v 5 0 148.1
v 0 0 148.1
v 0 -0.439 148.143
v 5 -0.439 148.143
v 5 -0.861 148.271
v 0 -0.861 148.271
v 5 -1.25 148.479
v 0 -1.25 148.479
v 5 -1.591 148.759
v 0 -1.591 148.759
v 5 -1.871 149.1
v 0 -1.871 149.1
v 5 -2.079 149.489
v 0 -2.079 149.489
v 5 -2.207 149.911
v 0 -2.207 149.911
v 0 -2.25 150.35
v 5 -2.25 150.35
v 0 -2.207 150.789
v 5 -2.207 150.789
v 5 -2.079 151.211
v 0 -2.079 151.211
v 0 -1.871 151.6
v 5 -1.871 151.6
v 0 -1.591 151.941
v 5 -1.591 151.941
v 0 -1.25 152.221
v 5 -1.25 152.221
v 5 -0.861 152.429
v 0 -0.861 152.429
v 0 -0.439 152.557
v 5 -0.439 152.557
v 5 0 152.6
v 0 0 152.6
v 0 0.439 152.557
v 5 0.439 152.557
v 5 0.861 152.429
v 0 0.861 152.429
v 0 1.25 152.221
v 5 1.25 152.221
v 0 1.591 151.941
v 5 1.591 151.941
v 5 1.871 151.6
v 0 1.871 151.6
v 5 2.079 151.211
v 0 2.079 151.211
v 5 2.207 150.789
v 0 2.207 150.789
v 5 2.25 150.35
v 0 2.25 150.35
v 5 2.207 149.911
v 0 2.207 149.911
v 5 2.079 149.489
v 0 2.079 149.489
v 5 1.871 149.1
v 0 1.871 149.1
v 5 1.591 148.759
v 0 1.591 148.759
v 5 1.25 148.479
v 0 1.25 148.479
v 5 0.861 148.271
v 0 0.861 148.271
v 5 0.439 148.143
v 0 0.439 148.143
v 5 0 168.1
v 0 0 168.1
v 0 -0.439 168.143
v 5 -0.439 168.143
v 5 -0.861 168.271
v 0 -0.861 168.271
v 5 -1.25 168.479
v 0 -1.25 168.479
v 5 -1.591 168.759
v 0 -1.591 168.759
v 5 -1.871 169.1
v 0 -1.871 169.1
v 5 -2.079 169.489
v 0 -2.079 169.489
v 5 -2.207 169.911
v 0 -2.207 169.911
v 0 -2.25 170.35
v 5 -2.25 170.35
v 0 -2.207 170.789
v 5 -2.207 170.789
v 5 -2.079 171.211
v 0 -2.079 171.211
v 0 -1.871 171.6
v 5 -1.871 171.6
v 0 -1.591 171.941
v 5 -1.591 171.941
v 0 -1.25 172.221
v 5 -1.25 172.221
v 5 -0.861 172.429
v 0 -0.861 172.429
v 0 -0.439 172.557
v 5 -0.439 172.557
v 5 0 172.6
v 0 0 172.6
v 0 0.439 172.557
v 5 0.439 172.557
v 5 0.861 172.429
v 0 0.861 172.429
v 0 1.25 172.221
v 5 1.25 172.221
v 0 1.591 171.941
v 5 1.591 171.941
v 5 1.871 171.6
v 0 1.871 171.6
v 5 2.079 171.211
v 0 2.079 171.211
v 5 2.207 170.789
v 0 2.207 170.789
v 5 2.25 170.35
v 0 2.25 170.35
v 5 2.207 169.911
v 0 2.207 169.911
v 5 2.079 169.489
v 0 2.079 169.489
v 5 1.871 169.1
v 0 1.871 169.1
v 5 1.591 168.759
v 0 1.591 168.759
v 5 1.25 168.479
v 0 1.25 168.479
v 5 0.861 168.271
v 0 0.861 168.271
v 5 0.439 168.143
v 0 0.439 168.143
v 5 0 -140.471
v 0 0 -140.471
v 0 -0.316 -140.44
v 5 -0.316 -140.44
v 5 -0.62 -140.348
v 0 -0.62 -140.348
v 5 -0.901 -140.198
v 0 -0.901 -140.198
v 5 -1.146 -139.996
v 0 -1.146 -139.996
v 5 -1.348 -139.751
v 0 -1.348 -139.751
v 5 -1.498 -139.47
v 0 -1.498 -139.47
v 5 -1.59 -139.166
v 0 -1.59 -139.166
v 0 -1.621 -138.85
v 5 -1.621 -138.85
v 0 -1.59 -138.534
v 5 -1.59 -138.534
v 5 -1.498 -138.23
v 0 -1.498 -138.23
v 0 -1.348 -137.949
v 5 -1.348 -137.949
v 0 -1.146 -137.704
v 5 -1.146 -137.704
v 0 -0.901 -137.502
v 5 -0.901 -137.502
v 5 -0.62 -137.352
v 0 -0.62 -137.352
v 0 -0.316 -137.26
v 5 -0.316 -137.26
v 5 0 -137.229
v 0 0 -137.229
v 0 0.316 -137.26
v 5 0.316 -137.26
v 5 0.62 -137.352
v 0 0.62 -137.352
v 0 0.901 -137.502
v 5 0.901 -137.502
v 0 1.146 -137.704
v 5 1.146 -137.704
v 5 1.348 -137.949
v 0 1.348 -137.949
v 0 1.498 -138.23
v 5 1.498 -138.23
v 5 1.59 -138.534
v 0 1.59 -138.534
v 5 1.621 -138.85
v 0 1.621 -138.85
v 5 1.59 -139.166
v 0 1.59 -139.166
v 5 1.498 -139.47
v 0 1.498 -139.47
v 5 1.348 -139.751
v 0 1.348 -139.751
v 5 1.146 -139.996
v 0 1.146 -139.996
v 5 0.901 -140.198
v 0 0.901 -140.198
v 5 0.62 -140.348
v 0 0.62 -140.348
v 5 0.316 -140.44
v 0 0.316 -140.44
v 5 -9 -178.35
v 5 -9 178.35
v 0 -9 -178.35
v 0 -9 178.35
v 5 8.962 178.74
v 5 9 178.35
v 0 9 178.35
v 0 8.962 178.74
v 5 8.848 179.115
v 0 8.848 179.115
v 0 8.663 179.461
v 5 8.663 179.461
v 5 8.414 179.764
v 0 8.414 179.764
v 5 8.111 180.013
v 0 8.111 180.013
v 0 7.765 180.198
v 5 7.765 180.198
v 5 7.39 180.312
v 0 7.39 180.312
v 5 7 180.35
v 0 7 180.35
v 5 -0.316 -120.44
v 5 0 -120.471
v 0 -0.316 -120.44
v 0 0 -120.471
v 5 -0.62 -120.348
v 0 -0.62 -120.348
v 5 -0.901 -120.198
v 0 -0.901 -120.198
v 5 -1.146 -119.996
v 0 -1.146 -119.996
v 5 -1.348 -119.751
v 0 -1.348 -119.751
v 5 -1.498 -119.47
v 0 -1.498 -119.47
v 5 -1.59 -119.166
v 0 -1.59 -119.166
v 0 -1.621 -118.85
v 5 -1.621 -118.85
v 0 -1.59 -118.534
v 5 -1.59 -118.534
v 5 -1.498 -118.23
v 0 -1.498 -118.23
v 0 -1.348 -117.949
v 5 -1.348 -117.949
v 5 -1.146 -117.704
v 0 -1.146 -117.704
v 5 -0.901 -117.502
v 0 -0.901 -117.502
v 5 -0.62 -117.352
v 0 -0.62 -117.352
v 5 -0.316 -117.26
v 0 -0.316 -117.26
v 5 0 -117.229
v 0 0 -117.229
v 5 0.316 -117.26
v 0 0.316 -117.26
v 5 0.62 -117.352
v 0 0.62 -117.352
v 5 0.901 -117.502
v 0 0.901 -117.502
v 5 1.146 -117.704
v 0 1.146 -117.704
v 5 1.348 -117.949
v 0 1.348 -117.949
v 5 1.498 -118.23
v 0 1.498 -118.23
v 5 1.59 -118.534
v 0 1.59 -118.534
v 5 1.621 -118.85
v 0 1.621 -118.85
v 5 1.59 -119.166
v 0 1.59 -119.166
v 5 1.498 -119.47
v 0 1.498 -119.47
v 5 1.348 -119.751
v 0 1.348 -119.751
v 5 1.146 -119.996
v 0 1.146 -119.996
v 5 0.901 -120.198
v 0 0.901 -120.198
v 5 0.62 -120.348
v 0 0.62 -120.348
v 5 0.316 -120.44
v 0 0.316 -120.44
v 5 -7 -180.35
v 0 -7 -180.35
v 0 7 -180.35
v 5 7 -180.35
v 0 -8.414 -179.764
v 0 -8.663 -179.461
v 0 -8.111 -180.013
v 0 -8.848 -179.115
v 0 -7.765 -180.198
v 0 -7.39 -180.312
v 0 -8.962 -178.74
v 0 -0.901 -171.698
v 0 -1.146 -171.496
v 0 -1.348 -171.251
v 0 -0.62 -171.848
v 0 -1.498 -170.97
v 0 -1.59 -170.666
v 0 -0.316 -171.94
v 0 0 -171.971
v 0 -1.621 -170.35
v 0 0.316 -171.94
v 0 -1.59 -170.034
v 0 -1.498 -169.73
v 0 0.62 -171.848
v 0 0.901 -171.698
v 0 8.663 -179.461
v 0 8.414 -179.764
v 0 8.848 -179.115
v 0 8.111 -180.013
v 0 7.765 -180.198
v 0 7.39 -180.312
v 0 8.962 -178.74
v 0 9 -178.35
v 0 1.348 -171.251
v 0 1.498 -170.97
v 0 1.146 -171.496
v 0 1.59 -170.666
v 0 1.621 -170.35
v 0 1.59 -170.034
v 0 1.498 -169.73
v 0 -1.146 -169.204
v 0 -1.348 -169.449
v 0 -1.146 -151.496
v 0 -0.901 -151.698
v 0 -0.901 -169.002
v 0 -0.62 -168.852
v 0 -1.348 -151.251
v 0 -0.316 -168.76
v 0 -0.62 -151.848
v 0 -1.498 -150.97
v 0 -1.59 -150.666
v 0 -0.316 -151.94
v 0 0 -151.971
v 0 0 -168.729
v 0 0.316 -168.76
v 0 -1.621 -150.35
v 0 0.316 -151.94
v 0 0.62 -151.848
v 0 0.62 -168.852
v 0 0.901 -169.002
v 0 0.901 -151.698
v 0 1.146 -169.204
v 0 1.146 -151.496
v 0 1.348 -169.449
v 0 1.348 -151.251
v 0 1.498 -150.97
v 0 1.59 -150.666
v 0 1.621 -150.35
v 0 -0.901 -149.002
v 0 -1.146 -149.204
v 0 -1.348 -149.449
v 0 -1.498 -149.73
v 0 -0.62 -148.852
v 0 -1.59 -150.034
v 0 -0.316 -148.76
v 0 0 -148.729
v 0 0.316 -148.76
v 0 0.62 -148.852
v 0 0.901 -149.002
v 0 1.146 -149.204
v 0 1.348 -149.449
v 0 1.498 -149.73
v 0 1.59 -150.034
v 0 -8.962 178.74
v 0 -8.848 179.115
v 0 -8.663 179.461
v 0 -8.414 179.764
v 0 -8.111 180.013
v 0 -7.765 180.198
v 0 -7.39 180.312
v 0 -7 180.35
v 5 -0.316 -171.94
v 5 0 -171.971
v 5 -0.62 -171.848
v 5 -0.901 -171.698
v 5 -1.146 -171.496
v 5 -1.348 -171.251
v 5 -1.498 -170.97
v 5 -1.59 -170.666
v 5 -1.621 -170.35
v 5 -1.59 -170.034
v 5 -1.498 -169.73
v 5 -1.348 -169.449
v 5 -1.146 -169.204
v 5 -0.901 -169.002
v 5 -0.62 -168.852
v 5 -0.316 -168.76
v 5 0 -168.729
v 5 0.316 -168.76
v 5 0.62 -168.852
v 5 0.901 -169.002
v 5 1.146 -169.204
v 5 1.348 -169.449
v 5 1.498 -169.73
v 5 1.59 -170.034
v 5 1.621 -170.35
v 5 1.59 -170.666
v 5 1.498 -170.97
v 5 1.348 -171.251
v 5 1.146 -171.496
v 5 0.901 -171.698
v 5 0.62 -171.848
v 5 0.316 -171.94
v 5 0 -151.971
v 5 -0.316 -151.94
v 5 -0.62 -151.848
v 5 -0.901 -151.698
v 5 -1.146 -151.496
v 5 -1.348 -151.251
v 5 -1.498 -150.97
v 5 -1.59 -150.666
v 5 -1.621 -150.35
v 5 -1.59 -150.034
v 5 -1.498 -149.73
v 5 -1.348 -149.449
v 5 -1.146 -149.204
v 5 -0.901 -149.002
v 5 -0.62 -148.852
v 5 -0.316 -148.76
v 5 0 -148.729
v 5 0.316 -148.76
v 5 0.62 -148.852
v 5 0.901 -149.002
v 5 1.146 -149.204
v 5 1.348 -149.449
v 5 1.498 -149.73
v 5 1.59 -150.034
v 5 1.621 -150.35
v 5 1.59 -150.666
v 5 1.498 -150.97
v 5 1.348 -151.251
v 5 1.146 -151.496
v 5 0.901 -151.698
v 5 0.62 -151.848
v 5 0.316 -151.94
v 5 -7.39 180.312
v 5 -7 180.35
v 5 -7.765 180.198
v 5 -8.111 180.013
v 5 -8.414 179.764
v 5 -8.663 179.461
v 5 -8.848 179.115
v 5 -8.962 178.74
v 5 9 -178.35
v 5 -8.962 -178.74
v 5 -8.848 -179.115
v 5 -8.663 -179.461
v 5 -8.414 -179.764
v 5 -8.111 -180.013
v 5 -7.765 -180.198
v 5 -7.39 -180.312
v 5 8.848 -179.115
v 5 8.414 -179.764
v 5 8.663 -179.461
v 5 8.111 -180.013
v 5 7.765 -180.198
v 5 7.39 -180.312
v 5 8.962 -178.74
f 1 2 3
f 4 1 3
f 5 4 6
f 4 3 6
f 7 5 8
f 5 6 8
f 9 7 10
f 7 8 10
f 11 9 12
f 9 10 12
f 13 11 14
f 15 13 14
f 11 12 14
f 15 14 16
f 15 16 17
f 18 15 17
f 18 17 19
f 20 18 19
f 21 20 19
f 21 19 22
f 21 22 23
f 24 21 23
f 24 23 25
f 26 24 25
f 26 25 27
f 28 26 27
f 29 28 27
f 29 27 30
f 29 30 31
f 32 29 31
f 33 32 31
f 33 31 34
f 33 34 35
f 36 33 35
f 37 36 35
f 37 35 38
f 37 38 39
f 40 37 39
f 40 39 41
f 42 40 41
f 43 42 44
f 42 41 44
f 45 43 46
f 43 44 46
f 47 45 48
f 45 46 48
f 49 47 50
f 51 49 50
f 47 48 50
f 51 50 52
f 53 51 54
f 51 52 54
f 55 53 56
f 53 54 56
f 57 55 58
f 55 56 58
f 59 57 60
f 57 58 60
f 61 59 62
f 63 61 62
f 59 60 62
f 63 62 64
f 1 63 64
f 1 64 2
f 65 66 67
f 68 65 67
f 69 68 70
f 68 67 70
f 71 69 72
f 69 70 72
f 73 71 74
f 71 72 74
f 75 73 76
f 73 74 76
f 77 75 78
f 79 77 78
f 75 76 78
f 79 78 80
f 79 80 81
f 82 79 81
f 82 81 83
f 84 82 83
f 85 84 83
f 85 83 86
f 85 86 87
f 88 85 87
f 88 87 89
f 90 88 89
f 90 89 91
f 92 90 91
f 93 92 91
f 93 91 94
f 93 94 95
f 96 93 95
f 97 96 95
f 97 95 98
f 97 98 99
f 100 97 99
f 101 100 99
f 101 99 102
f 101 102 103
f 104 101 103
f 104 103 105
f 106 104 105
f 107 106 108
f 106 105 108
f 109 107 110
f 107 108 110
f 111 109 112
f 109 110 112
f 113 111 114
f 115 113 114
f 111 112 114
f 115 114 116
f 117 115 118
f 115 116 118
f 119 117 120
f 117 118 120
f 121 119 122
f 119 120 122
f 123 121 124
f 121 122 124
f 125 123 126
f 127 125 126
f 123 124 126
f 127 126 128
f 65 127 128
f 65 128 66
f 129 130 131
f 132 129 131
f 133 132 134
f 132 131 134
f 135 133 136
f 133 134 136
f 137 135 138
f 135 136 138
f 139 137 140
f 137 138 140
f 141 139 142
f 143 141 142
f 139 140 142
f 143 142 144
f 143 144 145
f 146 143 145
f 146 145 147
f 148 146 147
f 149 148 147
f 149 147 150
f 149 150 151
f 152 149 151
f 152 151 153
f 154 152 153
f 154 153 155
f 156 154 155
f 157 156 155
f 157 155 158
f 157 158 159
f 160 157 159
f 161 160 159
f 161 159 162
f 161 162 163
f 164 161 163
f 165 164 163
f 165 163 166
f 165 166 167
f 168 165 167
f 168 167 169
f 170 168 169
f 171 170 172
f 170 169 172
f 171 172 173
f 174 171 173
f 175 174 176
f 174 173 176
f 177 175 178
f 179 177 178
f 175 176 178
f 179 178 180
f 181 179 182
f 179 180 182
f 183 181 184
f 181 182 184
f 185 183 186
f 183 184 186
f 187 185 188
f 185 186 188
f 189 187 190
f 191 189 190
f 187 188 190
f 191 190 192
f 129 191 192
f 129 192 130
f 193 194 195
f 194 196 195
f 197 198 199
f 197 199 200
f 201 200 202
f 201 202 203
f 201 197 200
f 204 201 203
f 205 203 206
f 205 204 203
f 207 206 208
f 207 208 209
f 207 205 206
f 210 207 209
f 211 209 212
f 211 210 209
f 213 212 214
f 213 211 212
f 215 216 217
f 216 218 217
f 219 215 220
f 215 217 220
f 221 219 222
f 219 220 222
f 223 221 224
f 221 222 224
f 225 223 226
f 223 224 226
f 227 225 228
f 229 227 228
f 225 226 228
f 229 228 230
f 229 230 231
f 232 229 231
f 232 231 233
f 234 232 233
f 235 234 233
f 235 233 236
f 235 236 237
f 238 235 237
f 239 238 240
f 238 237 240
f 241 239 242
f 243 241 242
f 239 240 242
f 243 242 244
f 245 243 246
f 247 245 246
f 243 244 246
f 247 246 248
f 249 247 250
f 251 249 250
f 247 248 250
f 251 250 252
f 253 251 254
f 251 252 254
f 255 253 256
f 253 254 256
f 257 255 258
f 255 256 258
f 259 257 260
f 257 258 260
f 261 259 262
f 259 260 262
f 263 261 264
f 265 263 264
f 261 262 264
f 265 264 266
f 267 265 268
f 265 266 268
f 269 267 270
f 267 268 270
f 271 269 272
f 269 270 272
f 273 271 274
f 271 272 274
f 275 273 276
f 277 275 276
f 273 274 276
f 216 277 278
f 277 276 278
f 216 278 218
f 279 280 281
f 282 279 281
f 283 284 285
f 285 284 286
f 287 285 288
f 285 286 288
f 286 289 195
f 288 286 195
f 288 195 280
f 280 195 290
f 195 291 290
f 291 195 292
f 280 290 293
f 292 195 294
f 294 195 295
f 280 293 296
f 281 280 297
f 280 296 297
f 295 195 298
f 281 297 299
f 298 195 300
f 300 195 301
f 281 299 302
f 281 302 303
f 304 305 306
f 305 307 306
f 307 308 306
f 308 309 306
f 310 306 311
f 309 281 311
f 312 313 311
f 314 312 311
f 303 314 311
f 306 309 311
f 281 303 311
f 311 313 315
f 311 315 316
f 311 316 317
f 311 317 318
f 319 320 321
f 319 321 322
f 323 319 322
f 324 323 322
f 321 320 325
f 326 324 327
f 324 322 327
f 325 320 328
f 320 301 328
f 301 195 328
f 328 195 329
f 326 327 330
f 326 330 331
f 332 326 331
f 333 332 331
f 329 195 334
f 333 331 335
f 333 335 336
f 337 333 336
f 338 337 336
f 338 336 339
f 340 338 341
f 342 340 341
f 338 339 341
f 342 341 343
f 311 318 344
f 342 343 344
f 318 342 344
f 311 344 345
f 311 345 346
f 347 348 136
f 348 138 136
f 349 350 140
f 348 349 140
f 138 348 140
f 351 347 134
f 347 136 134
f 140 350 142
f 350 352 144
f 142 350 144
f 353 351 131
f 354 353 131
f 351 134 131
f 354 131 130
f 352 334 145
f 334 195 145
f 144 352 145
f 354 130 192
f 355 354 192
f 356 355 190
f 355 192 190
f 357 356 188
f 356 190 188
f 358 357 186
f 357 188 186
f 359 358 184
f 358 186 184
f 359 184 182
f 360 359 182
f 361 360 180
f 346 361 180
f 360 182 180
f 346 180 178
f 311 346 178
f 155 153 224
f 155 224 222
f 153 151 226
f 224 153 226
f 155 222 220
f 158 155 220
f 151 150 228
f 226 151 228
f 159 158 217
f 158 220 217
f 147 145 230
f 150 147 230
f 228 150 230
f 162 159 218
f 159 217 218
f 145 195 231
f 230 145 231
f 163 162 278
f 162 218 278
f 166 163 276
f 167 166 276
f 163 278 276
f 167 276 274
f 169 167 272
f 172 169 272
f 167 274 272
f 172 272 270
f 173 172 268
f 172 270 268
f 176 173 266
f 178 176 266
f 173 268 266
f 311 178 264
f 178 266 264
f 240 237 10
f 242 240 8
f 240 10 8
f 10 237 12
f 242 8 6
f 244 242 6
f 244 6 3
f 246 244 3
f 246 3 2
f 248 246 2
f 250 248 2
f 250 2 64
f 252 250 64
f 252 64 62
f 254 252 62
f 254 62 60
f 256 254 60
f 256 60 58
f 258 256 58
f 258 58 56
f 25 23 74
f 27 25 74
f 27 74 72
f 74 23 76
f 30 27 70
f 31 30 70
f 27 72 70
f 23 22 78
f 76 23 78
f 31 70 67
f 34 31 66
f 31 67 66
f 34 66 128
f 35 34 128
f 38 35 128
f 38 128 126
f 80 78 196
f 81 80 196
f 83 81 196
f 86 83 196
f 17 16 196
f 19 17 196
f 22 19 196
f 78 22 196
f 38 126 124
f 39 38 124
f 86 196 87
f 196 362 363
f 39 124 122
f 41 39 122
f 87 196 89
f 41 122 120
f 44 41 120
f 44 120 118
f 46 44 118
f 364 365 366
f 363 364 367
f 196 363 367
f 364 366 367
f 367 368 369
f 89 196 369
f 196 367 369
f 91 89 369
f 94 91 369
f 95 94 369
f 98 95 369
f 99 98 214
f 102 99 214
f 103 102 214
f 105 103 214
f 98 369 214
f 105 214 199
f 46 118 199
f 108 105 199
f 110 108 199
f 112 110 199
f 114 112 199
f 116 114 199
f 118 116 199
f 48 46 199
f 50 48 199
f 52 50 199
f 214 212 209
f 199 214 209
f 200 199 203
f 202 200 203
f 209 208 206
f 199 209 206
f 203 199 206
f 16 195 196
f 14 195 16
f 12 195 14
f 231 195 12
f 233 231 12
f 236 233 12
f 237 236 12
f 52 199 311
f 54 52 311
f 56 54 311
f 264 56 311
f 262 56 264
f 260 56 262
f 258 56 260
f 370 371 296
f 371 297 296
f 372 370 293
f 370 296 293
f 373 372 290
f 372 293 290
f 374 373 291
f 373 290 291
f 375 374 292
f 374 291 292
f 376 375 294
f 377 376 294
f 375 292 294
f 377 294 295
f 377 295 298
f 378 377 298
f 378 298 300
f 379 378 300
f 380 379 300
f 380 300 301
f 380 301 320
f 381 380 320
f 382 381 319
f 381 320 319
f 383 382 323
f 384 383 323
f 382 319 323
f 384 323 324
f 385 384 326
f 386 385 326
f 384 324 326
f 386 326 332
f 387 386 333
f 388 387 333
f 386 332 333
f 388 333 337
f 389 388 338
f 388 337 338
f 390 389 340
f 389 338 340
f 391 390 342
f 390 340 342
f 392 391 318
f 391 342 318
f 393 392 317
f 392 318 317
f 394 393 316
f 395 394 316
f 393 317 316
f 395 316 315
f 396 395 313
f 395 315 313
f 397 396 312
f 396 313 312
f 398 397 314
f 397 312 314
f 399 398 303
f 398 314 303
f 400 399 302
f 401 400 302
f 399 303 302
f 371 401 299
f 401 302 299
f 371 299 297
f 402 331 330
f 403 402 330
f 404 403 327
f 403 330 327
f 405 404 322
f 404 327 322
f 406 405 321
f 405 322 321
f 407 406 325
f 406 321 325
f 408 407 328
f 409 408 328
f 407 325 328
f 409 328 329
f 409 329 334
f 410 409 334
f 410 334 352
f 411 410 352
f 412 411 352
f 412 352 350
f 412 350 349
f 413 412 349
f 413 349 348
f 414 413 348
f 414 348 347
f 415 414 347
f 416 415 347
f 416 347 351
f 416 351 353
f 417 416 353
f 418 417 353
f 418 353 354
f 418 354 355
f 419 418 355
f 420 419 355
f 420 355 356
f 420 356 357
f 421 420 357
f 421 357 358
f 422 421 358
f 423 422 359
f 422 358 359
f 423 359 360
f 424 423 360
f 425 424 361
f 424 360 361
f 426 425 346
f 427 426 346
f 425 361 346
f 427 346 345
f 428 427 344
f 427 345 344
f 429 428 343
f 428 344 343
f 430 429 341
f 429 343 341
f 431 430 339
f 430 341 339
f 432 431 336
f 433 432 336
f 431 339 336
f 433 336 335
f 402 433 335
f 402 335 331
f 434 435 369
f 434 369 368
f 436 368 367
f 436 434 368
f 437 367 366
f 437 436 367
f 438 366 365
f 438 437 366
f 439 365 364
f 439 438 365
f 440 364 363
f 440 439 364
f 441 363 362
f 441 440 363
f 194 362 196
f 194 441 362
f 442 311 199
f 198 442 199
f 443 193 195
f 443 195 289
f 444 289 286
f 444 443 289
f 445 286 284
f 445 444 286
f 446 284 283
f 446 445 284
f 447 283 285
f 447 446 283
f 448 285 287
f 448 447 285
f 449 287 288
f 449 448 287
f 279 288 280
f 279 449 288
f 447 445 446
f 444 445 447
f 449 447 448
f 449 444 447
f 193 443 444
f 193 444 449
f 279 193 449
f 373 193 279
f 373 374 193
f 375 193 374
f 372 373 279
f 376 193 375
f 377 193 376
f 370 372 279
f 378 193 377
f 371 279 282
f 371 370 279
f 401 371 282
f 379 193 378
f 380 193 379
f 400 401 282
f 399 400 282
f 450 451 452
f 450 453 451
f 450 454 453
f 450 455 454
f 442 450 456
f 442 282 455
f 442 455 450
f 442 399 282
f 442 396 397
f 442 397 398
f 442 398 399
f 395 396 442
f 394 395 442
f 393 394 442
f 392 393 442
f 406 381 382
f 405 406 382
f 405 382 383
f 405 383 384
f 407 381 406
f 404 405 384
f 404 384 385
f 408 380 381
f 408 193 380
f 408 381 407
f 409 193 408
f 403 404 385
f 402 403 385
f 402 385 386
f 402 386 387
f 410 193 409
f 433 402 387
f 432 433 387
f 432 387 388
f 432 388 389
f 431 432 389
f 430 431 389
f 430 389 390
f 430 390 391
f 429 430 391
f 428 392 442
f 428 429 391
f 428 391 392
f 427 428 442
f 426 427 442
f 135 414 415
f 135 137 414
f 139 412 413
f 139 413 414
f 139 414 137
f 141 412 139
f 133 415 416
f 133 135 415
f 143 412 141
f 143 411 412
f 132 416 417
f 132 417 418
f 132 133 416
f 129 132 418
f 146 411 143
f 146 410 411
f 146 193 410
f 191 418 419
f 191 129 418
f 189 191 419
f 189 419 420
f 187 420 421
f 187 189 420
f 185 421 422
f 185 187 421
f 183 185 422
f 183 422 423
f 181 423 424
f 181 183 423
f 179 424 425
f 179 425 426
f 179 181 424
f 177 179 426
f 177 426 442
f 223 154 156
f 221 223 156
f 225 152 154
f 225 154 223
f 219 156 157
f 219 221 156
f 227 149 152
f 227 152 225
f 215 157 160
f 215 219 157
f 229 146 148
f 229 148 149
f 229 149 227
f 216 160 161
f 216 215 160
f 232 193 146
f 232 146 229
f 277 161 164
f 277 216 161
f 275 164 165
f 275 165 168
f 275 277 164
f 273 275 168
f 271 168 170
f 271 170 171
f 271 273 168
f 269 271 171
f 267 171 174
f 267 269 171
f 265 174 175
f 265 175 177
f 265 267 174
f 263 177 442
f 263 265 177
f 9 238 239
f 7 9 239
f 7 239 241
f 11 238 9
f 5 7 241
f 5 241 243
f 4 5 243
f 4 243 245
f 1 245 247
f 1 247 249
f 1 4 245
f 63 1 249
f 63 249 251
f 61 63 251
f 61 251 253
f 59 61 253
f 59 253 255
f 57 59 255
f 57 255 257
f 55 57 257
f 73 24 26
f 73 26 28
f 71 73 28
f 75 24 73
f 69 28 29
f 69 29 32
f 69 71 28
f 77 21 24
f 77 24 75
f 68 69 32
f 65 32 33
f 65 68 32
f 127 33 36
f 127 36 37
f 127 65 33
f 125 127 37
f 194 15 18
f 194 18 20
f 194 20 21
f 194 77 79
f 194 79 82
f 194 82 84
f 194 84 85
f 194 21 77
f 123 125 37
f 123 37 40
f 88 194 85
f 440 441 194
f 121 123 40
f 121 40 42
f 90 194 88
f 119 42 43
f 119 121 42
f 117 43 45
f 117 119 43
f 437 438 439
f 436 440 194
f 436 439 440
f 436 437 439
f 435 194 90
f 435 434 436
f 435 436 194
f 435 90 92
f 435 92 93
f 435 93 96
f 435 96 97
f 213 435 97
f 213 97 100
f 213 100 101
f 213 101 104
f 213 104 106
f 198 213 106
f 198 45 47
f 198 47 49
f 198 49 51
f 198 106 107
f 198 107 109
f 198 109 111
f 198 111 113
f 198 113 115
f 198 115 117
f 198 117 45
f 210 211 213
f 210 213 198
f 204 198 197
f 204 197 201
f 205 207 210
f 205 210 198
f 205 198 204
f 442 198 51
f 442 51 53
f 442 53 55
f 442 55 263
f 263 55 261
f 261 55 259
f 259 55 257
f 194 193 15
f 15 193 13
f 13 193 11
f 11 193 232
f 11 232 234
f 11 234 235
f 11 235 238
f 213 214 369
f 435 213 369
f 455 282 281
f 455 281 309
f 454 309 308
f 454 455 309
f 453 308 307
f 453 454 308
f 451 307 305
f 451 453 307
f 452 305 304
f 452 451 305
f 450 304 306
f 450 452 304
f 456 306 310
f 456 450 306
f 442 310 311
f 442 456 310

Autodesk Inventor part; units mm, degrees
ref_plane "YZ Plane" through (0, 0, 0) normal (1, 0, 0) x (0, 1, 0)
ref_plane "XZ Plane" through (0, 0, 0) normal (0, 1, 0) x (-1, 0, 0)
ref_plane "XY Plane" through (0, 0, 0) normal (0, 0, 1) x (1, 0, 0)
sketch "Skizze1" plane through (0, 0, 0) normal (1, 0, 0) x (0, 1, 0)
  line L0 (9, 180.35) -> (-9, 180.35)
  line L1 (-9, 180.35) -> (-9, -180.35)
  line L2 (-9, -180.35) -> (9, -180.35)
  line L3 (9, -180.35) -> (9, 180.35)
  point P0 (0, 0)
  point P1 (-9, 0)
  point P2 (0, -180.35)
  dimension "d0" = 360.7
  dimension "d1" = 18
extrude "Extrusion1" add sketch "Skizze1" along normal blind 5
fillet "Rundung1" radius 2 4 edges at (2.5, 9, 180.35) (2.5, -9, 180.35) (2.5, 9, -180.35) (2.5, -9, -180.35)
sketch "Skizze2" plane through (5, 0, 0) normal (1, 0, 0) x (0, 0, -1)
  line L0 (-180.35, 7) -> (-180.35, -7) projected
  line L1 (178.35, 9) -> (-178.35, 9) projected
  line L2 (148.85, 9) -> (148.85, -9) construction
  line L3 (-178.35, -9) -> (178.35, -9) projected
  line L4 (180.35, -7) -> (180.35, 7) projected
  point P0 (0, 0)
  point P1 (-170.35, 0)
  point P2 (-150.35, 0)
  point P3 (138.85, 0)
  point P4 (118.85, 0)
  point P5 (170.35, 0)
  point P6 (150.35, 0)
  dimension "d5" = 10
  dimension "d6" = 20
  dimension "d7" = 329.2
  dimension "d8" = 10
  dimension "d9" = 20
  dimension "d10" = 10
  dimension "d11" = 20
hole "Bohrung1" at (5, 0, -138.85) at (5, 0, -118.85) at (5, 0, -170.35) at (5, 0, -150.35) direction (-1, 0, 0) diameter 3.242 end through all thread size "M4x0.7" class "6H" standard "ISO Metric profile"
hole "Bohrung2" at (5, 0, 170.35) at (5, 0, 150.35) direction (-1, 0, 0) diameter 4.5 end through all clearance for "Flachkopfsenkschraube DIN EN ISO 2009" size "M4" standard "DIN"
equation "\"d_tol\" = 0.3"
equation "\"d_wand\" = 1.5"
equation "\"b_rasp_pi\" = 56"
equation "\"w_kamera_hori\" = 66deg"
equation "\"l_rasp_pi\" = 85"
equation "\"w_kamera_vert\" = 41deg"
equation "\"r_rasp_pi\" = 3"
equation "\"D_oct\" = 3621.32034"
equation "\"D_hexadeca\" = 7541.00924"
equation "\"d_traeger\" = 625"
properties part number "Sstab"
